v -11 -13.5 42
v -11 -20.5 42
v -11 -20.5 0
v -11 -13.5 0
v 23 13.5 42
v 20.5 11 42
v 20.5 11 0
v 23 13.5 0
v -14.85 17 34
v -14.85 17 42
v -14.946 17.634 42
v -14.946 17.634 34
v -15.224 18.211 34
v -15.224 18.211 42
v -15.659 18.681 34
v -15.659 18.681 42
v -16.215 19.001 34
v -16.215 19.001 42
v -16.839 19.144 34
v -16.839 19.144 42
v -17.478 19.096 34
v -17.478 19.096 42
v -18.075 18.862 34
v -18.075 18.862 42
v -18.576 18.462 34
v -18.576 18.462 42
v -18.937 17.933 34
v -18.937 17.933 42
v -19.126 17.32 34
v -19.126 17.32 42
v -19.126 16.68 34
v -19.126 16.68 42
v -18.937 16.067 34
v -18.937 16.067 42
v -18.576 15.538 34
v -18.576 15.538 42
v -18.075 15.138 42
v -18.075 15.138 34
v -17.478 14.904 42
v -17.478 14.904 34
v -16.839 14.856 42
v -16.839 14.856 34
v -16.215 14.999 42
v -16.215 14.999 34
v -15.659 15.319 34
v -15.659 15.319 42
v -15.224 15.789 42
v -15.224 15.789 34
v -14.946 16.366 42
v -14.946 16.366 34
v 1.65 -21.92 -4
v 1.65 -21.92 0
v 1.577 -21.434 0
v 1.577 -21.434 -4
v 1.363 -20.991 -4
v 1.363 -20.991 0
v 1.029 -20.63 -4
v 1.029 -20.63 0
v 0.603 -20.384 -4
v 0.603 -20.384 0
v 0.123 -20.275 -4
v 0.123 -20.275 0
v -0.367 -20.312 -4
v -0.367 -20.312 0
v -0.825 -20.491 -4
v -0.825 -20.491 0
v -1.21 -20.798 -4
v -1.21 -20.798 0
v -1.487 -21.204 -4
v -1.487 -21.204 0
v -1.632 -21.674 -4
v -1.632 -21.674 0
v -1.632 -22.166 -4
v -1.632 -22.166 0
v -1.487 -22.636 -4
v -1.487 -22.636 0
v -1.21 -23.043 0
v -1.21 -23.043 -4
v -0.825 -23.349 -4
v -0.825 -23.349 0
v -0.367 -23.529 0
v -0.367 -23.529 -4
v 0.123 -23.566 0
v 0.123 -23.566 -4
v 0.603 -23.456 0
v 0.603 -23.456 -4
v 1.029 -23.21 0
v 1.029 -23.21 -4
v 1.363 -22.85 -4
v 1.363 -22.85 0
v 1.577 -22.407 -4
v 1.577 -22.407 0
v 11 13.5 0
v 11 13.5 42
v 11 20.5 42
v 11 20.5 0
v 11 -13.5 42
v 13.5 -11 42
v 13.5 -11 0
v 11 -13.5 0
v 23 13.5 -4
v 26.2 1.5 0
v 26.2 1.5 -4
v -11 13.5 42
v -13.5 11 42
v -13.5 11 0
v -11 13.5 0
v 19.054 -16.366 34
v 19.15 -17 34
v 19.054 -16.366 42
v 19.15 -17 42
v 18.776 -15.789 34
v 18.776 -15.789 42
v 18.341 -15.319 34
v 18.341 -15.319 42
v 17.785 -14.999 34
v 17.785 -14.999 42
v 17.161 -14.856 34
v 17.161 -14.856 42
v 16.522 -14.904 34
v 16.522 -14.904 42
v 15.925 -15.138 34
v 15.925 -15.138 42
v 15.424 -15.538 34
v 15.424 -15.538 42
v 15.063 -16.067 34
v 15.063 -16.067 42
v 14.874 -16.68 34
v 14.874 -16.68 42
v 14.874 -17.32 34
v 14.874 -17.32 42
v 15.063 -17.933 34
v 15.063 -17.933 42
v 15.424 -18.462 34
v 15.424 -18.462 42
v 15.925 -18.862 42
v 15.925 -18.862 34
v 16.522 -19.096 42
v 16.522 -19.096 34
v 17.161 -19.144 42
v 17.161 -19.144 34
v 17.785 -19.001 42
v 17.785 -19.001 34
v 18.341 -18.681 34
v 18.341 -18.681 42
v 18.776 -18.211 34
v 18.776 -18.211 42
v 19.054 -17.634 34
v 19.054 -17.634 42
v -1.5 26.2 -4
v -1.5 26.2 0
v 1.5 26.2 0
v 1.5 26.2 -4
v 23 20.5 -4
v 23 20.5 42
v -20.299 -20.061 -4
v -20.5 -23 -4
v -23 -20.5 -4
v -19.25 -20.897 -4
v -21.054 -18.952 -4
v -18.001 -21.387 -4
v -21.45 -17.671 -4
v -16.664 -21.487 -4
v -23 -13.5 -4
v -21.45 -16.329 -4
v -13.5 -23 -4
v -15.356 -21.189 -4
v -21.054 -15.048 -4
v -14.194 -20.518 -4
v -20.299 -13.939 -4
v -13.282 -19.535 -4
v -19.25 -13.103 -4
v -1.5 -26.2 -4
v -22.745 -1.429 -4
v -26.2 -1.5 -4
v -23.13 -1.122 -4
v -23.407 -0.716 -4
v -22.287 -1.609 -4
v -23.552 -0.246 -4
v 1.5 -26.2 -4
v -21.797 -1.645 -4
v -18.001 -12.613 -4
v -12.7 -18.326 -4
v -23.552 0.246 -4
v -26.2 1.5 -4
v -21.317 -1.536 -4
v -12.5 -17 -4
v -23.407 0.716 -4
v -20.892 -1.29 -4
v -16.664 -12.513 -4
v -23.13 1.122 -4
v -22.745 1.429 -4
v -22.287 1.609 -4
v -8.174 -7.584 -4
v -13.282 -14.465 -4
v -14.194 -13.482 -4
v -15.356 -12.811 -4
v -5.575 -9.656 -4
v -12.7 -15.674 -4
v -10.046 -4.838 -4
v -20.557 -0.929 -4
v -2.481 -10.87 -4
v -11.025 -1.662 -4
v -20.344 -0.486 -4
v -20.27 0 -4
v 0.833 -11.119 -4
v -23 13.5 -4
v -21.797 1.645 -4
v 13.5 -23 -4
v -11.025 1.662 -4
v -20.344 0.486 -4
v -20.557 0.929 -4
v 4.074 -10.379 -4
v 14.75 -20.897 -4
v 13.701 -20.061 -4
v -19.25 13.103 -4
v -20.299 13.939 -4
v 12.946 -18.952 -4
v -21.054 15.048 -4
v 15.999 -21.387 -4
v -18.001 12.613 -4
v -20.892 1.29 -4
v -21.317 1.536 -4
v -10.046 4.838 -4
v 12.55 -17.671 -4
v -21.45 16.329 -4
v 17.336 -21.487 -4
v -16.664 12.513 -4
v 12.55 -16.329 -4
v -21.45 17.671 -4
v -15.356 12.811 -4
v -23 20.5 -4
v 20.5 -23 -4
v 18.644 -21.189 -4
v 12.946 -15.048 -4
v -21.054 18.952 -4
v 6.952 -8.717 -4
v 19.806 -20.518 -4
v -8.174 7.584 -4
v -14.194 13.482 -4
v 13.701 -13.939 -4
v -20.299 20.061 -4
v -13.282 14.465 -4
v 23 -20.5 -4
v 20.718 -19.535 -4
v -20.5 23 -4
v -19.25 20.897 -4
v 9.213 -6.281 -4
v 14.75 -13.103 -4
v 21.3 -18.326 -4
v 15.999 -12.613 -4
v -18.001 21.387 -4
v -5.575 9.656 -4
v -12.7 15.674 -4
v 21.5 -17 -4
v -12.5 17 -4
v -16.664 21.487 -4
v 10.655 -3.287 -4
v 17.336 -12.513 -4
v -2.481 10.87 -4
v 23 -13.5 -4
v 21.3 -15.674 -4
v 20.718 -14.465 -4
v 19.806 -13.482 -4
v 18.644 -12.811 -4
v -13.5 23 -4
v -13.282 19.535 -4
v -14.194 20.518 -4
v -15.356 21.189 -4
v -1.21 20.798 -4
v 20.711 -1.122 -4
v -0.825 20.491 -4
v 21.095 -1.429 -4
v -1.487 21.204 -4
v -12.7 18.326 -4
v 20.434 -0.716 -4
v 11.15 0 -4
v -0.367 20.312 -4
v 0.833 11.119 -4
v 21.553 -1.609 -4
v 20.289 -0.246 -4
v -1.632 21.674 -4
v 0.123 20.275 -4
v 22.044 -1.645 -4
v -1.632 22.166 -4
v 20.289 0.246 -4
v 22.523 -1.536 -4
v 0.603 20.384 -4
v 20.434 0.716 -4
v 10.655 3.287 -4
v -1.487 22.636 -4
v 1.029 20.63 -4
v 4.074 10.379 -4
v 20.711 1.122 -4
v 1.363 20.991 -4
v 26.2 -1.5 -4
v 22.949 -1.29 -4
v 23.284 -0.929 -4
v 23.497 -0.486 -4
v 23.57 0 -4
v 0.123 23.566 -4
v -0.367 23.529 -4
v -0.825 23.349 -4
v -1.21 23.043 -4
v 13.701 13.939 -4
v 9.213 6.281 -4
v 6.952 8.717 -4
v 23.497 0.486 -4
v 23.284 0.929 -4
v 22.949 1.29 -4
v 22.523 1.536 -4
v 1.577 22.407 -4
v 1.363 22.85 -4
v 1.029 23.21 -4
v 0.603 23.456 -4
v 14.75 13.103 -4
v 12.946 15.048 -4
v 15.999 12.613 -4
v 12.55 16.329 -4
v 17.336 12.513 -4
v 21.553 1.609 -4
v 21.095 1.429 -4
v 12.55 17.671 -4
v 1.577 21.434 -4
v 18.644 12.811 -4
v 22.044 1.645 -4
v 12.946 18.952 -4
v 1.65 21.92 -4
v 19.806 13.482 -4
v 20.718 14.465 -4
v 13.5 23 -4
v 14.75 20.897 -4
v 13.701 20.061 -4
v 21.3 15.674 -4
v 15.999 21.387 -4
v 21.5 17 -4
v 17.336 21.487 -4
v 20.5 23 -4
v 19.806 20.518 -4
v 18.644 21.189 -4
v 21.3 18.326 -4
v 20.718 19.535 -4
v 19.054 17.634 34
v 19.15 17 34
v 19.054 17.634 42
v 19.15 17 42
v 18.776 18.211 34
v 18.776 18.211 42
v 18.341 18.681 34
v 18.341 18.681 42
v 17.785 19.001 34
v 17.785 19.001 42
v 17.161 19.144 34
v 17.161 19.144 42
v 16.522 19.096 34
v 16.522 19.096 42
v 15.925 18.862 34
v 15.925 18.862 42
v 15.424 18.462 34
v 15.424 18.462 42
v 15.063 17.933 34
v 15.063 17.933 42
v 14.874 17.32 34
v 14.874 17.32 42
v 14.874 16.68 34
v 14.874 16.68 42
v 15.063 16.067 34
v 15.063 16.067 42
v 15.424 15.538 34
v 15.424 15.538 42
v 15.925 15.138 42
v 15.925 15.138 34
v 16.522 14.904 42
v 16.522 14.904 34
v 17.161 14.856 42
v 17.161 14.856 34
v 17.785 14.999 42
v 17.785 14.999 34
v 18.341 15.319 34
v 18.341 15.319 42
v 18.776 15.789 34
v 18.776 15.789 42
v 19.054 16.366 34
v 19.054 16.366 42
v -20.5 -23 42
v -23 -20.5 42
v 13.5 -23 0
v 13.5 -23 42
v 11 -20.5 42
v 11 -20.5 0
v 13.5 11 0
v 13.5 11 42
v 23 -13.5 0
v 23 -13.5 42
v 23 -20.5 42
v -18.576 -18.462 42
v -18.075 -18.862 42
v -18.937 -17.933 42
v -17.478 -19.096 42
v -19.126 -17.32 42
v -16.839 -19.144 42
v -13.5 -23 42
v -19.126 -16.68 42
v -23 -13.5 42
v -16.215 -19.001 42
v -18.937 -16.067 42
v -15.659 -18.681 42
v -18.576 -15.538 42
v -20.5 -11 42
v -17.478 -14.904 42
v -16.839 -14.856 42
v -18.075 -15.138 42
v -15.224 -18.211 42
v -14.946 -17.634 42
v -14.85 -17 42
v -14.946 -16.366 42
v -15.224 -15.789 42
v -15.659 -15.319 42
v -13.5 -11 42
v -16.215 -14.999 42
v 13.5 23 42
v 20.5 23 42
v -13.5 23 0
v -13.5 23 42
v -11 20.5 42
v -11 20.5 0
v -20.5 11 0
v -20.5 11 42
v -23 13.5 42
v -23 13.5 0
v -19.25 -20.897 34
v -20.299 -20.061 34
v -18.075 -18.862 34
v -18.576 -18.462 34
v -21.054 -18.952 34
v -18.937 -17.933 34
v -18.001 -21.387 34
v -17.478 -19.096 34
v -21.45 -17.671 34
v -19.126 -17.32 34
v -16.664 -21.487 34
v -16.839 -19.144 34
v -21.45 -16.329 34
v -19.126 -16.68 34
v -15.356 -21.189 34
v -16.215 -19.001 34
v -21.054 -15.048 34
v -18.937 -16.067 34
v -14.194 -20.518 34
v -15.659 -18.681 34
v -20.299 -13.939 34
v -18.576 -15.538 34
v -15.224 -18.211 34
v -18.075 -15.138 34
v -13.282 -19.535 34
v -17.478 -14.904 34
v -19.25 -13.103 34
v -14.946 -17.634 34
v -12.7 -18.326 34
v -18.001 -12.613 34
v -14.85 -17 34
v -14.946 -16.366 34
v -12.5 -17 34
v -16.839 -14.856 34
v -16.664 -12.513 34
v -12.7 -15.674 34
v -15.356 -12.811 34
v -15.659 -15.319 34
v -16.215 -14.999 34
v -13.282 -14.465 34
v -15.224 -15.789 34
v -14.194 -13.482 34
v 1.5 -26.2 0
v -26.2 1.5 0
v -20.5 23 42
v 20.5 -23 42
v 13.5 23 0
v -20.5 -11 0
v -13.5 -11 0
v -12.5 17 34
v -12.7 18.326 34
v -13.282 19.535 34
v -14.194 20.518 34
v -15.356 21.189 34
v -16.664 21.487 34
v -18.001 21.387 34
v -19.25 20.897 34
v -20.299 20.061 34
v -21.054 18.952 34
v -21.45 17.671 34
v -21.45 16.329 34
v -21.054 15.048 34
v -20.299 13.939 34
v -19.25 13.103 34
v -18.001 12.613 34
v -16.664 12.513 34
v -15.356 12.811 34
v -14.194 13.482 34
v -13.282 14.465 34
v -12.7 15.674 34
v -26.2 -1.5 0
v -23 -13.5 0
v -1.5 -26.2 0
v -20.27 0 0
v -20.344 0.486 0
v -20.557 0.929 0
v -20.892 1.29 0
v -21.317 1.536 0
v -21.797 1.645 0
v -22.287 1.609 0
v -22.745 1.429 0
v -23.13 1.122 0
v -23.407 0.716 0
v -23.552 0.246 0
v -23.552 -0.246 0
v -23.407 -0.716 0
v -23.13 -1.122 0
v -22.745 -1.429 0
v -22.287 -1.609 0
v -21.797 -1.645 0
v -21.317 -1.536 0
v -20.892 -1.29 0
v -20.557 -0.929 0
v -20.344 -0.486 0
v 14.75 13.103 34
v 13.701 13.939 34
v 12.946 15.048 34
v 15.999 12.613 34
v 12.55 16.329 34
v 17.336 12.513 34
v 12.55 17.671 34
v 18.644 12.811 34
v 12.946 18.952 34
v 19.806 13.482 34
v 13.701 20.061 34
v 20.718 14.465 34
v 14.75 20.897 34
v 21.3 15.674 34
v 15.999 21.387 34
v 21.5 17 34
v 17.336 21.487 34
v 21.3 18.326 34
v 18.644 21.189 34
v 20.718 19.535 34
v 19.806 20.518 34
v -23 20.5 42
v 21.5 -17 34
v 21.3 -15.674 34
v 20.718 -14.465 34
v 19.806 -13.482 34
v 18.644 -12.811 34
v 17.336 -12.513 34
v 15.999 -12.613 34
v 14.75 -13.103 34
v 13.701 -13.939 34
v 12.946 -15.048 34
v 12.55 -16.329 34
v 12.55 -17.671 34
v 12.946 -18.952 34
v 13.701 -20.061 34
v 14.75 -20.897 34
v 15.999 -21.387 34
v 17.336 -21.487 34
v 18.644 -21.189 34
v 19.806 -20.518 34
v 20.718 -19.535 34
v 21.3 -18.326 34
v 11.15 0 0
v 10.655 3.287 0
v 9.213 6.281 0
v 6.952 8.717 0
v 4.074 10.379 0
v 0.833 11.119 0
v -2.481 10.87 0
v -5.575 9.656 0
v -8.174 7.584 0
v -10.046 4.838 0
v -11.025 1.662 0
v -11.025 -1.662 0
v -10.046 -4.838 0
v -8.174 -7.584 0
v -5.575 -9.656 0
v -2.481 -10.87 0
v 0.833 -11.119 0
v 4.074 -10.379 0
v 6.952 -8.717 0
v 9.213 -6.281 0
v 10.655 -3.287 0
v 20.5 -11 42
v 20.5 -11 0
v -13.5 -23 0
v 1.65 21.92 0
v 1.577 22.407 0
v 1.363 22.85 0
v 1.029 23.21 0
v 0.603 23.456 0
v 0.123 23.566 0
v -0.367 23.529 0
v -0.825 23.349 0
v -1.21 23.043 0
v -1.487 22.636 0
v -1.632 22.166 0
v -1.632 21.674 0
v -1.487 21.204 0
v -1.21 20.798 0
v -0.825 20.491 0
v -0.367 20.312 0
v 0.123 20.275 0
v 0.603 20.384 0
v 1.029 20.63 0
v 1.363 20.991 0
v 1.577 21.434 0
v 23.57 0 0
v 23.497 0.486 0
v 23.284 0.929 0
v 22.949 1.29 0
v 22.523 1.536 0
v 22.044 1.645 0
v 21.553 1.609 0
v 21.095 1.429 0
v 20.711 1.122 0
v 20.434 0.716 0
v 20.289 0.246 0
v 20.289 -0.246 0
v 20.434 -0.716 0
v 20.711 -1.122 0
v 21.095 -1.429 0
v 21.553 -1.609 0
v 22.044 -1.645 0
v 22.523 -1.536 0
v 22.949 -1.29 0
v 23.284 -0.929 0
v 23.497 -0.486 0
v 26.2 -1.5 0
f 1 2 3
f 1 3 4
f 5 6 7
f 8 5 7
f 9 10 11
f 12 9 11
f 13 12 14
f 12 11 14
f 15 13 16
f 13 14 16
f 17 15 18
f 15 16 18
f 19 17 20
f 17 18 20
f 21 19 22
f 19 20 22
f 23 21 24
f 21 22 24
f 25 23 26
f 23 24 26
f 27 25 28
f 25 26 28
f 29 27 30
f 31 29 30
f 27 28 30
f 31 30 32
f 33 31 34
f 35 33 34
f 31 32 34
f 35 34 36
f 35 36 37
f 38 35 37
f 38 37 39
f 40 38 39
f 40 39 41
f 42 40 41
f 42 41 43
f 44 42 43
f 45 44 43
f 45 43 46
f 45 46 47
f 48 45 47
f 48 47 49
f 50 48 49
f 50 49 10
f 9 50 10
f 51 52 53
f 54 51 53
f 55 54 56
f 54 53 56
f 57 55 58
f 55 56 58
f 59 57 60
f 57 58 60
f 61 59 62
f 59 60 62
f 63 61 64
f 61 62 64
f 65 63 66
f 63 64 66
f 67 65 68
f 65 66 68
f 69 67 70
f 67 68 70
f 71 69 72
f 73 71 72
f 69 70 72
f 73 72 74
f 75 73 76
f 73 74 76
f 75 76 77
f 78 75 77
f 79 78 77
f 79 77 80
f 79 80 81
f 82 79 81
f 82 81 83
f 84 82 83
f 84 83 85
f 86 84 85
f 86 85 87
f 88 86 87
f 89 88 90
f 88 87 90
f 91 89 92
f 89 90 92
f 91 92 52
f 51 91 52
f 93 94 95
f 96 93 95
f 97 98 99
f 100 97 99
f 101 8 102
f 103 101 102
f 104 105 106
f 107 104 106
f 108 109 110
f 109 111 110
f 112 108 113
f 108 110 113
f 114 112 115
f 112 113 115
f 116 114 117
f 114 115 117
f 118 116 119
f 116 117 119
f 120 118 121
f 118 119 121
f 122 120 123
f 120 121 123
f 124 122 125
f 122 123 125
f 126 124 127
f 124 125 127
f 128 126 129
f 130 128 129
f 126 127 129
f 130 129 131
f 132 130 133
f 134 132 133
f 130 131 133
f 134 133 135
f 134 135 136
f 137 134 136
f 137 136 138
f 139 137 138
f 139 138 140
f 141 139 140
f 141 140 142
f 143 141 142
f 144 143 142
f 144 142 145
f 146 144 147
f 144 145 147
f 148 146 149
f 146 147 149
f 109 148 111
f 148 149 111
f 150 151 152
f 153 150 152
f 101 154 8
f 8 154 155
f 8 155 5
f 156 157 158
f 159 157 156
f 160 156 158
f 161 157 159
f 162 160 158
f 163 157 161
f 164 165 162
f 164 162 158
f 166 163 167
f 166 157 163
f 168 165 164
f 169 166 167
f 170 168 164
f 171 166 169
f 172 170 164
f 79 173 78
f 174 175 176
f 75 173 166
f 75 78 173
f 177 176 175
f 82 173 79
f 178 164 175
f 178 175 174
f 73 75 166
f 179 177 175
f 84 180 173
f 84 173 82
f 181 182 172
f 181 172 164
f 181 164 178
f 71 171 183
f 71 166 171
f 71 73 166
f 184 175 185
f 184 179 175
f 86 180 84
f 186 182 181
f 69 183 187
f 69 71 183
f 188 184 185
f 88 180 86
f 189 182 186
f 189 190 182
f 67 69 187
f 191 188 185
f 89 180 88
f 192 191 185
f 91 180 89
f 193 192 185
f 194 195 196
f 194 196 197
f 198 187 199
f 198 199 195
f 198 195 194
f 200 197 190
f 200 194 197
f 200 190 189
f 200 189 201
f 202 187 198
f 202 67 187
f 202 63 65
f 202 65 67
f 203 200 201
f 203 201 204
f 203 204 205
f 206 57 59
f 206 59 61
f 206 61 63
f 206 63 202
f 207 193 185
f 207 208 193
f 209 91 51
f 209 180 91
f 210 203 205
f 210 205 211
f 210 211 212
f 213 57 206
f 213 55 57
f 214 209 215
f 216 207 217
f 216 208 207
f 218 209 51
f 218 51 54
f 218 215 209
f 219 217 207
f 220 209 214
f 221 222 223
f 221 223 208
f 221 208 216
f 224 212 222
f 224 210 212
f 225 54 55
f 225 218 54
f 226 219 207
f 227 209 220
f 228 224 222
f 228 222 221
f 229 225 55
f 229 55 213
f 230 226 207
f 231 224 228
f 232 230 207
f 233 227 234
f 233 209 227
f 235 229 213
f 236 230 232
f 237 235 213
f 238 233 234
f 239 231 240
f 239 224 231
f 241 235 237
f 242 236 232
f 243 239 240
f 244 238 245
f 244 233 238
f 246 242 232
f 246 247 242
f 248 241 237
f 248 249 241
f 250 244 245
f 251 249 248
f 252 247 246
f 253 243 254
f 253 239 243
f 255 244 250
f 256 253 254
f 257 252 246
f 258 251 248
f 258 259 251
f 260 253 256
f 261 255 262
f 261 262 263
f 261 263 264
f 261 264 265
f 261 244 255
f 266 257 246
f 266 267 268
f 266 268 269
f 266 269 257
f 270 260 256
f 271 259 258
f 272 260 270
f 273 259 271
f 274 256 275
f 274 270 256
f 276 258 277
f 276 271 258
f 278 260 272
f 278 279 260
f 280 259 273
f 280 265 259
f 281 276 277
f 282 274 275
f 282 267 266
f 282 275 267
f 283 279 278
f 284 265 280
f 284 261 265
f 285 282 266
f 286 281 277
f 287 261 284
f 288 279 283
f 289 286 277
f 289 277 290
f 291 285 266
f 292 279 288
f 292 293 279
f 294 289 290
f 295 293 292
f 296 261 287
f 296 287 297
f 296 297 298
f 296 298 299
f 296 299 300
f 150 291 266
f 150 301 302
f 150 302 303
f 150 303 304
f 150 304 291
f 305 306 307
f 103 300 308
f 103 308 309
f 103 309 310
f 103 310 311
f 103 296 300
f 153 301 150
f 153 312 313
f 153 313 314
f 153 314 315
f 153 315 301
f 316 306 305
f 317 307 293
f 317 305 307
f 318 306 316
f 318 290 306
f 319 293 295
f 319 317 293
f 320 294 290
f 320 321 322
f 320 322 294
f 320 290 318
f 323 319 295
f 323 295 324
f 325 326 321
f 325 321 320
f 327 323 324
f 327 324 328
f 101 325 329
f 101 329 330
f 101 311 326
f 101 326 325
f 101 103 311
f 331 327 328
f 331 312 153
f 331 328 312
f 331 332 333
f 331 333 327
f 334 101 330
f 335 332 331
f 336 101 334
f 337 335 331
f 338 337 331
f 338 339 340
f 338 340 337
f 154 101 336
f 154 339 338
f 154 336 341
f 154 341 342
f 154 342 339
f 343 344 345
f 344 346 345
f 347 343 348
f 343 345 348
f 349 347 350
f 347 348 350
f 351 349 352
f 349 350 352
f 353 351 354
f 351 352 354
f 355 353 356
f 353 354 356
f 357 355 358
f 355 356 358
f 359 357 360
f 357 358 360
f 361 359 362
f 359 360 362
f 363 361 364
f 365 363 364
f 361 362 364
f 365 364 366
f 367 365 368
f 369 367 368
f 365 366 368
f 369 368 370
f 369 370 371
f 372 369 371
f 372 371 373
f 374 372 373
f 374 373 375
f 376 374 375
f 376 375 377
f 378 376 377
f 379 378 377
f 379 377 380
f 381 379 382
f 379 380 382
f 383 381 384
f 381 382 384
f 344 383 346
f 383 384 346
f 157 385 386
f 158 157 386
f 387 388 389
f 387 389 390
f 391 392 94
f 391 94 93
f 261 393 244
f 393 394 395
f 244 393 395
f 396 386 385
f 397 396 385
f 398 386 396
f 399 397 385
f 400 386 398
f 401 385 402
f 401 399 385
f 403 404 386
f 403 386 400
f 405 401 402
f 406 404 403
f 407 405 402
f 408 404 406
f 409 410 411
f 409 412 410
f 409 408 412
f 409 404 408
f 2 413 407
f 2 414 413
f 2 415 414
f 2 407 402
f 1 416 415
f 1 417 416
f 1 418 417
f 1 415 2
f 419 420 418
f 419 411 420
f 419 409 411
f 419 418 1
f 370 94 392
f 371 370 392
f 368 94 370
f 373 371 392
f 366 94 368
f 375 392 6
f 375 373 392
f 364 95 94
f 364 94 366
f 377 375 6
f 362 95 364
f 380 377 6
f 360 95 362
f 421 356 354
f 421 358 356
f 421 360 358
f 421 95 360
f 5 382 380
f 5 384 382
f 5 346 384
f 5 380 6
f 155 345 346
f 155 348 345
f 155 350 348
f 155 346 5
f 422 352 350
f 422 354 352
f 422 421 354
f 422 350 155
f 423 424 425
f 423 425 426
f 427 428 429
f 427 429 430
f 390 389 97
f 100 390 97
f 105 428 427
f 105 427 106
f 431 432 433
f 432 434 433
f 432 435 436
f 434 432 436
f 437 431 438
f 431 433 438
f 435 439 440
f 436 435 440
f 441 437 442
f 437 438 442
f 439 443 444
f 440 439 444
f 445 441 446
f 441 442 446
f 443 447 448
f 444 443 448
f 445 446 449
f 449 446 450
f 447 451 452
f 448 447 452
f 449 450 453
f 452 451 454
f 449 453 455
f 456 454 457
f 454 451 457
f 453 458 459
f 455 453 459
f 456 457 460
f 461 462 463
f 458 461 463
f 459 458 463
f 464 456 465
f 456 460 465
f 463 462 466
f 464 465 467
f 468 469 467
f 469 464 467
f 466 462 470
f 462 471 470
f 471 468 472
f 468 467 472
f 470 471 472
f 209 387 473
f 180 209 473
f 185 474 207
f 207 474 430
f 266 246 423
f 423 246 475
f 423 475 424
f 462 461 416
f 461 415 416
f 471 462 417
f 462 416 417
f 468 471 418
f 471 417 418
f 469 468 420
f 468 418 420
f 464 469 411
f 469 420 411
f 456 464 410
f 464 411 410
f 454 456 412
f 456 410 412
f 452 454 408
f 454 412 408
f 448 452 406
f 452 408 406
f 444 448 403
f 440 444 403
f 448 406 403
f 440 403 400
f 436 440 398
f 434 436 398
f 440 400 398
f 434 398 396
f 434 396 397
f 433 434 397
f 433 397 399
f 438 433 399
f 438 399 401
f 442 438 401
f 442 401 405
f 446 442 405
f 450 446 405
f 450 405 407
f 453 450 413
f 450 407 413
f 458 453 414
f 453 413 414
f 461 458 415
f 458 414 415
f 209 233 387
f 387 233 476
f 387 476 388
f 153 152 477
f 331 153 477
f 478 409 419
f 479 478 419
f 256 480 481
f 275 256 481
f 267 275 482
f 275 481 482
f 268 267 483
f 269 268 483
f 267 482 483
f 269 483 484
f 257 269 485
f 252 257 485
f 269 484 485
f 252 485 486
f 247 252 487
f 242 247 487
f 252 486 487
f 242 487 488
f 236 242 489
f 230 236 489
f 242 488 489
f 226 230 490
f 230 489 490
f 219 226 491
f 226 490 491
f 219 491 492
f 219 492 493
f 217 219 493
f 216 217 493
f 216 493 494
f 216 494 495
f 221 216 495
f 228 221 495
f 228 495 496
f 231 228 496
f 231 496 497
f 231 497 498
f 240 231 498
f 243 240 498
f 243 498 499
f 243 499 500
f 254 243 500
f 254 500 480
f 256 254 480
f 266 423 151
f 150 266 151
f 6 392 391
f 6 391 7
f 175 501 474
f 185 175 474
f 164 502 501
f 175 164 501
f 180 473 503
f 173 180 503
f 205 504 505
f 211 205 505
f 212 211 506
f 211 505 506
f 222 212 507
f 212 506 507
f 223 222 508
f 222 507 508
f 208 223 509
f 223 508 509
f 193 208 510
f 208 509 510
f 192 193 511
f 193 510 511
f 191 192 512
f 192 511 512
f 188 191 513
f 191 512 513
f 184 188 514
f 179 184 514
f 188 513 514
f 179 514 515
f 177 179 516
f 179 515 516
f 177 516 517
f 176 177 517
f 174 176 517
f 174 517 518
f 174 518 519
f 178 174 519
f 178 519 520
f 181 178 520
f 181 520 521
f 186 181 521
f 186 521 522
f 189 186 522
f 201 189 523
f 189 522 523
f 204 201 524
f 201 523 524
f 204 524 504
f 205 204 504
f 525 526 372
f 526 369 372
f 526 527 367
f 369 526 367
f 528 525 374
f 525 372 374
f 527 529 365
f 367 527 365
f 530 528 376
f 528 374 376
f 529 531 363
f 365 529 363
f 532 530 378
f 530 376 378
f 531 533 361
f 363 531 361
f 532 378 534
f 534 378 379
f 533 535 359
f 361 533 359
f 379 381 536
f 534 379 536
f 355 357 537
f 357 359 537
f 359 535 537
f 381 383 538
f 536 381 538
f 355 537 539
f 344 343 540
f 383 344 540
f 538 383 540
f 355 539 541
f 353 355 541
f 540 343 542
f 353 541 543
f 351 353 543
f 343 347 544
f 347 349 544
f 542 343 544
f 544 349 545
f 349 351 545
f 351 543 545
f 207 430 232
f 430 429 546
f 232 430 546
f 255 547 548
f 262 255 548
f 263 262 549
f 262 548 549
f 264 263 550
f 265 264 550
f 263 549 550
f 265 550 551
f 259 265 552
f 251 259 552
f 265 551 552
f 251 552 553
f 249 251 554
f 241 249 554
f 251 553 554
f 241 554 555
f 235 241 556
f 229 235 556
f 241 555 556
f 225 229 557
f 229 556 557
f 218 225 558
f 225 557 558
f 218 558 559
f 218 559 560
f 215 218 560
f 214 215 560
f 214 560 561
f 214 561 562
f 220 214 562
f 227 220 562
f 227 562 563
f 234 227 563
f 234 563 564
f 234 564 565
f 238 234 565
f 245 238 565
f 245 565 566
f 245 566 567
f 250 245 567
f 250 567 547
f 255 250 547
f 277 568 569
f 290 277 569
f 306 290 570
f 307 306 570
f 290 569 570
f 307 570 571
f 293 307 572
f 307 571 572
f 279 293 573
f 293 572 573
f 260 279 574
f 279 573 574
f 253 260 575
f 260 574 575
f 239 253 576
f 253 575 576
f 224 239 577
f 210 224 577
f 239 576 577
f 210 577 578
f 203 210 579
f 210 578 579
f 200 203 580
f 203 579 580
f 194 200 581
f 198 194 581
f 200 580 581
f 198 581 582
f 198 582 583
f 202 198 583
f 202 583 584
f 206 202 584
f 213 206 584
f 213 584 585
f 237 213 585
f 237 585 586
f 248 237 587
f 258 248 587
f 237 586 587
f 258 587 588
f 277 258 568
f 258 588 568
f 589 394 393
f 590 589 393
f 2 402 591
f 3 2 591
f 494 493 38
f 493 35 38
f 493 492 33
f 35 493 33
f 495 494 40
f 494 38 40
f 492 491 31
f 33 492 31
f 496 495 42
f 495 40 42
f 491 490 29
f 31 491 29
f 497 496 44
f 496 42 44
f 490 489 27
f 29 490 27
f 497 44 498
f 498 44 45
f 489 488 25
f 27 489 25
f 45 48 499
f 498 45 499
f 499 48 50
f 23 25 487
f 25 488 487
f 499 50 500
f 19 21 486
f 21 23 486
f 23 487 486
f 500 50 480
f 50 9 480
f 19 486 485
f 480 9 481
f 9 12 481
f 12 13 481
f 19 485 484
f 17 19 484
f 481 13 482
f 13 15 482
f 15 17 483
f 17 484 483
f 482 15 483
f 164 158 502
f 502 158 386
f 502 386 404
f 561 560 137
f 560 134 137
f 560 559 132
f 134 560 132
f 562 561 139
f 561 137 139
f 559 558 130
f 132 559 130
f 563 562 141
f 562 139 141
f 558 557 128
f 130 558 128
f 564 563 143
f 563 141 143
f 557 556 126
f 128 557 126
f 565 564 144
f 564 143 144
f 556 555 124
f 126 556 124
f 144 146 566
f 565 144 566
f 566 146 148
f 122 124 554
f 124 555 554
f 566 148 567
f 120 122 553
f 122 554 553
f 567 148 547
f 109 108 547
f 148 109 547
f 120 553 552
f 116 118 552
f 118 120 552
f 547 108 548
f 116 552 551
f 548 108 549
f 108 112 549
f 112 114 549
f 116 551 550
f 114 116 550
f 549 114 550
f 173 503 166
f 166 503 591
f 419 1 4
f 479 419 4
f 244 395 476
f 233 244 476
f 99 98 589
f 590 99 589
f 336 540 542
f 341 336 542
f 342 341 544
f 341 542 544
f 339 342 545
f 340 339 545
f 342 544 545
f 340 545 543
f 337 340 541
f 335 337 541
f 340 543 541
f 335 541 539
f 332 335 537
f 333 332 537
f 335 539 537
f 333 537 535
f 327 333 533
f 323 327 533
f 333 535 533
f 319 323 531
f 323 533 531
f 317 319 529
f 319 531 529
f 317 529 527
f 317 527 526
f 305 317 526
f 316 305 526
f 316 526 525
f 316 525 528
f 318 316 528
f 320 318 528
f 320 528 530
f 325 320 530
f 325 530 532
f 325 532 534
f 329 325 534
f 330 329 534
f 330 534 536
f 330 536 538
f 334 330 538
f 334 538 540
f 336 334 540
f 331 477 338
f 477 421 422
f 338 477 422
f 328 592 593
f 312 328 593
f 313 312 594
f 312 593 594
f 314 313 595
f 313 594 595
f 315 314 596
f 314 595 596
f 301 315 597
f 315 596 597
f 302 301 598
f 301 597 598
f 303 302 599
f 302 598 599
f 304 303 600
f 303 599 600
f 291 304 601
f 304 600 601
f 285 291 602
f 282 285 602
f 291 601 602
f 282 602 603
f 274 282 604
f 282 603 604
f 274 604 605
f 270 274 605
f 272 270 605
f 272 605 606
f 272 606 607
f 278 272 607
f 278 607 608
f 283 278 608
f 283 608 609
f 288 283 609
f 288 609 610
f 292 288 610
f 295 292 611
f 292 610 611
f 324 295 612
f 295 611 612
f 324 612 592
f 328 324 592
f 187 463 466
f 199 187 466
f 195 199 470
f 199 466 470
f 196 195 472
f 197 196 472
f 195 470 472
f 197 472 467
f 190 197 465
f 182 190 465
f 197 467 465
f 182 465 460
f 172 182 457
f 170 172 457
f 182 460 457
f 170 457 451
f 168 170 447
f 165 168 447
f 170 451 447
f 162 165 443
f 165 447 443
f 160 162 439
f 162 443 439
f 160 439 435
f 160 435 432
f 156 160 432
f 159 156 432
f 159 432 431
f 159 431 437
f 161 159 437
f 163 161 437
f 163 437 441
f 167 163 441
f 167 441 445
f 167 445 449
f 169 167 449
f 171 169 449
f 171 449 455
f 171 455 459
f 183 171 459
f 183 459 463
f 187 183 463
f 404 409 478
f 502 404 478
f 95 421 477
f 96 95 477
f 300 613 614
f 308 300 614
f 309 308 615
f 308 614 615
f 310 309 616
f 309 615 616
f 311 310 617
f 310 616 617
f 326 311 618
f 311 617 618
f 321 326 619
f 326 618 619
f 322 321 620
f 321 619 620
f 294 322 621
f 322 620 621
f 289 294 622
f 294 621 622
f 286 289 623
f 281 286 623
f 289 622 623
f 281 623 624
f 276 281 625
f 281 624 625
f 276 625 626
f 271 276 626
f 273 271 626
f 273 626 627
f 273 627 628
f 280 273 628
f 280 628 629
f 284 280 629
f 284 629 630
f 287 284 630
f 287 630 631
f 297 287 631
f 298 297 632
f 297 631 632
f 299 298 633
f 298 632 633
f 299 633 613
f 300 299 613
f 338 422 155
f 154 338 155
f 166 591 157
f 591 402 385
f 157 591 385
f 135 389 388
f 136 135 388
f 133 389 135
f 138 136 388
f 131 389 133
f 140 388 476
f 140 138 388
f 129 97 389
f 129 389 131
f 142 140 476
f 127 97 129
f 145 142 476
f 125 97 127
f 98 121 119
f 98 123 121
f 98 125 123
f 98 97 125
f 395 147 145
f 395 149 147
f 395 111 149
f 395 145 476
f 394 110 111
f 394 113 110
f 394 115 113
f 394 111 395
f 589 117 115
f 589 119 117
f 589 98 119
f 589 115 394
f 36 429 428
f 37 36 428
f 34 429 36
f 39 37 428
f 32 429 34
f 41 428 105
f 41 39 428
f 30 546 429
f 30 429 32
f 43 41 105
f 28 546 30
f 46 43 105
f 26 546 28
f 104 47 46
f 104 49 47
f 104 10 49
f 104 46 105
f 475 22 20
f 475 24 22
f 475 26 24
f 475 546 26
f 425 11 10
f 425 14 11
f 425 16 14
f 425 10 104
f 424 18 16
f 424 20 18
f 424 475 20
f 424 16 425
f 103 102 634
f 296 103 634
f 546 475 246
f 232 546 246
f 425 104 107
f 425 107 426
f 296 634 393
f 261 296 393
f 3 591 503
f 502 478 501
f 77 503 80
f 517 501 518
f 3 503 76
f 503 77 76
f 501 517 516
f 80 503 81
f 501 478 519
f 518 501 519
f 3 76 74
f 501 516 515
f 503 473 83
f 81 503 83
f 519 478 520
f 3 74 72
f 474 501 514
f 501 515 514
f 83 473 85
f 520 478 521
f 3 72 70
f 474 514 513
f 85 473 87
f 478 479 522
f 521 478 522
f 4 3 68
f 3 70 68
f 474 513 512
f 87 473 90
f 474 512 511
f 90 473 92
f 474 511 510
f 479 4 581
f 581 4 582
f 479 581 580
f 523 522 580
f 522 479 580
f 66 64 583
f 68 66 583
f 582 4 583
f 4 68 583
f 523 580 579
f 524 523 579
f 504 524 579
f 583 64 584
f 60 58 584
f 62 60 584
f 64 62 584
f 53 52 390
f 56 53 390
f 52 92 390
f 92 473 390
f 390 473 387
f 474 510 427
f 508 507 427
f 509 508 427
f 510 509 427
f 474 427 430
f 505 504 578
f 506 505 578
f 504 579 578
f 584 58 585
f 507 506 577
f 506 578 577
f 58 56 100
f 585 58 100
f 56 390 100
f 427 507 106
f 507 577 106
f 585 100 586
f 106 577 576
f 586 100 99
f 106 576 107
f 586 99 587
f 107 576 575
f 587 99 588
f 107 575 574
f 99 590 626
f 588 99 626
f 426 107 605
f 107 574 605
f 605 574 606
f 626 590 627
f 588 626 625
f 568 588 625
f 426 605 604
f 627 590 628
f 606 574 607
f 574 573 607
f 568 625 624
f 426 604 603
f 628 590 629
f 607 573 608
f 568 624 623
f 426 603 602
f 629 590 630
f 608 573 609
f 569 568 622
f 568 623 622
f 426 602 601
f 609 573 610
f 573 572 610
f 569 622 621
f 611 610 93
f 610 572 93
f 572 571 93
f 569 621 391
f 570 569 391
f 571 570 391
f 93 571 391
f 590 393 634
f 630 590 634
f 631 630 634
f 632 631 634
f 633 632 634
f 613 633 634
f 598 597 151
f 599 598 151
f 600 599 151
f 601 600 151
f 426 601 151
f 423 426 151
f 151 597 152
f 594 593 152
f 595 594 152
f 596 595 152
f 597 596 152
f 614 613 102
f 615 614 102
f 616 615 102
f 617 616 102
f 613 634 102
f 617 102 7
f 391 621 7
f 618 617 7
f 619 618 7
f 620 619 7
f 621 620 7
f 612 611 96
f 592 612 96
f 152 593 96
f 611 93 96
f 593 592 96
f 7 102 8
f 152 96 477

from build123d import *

# Parameters (mm, degrees)
SKETCH1_W           = 50
SKETCH1_H           = 50
SKETCH1_R           = 11.15
SKETCH1_R_2         = 2.15
SKETCH1_R_3         = 1.65
BOSS_EXTRUDE1_DEPTH = 4
BOSS_EXTRUDE2_START = 42
SKETCH2_W           = 12
SKETCH2_H           = 12
SKETCH2_R           = 2.15
BOSS_EXTRUDE2_DEPTH = 42
CHAMFER1_SIZE       = 2.5
CUT_EXTRUDE1_START  = -8
SKETCH3_R           = 4.5
CUT_EXTRUDE1_DEPTH  = 51.017238817
SKETCH5_W           = 56
SKETCH5_H           = 56
CUT_EXTRUDE2_DEPTH  = 55.899908925
BOSS_EXTRUDE3_DEPTH = 4
CIRPATTERN1_COUNT   = 4


with BuildPart() as part:
    # Sketch1 → Boss-Extrude1 (new body)
    with BuildSketch(Plane.XY):
        Rectangle(SKETCH1_W, SKETCH1_H)
        Circle(SKETCH1_R, mode=Mode.SUBTRACT)
        with Locations((-17, 17)):
            Circle(SKETCH1_R_2, mode=Mode.SUBTRACT)
        with Locations((17, 17)):
            Circle(SKETCH1_R_2, mode=Mode.SUBTRACT)
        with Locations((17, -17)):
            Circle(SKETCH1_R_2, mode=Mode.SUBTRACT)
        with Locations((-17, -17)):
            Circle(SKETCH1_R_2, mode=Mode.SUBTRACT)
        with Locations((-21.920310217, 0)):
            Circle(SKETCH1_R_3, mode=Mode.SUBTRACT)
        with Locations((0, 21.920310217)):
            Circle(SKETCH1_R_3, mode=Mode.SUBTRACT)
        with Locations((21.920310217, 0)):
            Circle(SKETCH1_R_3, mode=Mode.SUBTRACT)
        with Locations((0, -21.920310217)):
            Circle(SKETCH1_R_3, mode=Mode.SUBTRACT)
    extrude(amount=-BOSS_EXTRUDE1_DEPTH)

    # Sketch2 → Boss-Extrude2 (add)
    # profile 1 of 4: a face of its own
    with BuildSketch(Plane.XY.offset(BOSS_EXTRUDE2_START)):
        with Locations((-17, 17)):
            Rectangle(SKETCH2_W, SKETCH2_H)
        with Locations((-17, 17)):
            Circle(SKETCH2_R, mode=Mode.SUBTRACT)
    # profile 2 of 4: a face of its own
    with BuildSketch(Plane.XY.offset(BOSS_EXTRUDE2_START)):
        with Locations((17, 17)):
            Rectangle(SKETCH2_W, SKETCH2_H)
        with Locations((17, 17)):
            Circle(SKETCH2_R, mode=Mode.SUBTRACT)
    # profile 3 of 4: a face of its own
    with BuildSketch(Plane.XY.offset(BOSS_EXTRUDE2_START)):
        with Locations((17, -17)):
            Rectangle(SKETCH2_W, SKETCH2_H)
        with Locations((17, -17)):
            Circle(SKETCH2_R, mode=Mode.SUBTRACT)
    # profile 4 of 4: a face of its own
    with BuildSketch(Plane.XY.offset(BOSS_EXTRUDE2_START)):
        with Locations((-17, -17)):
            Rectangle(SKETCH2_W, SKETCH2_H)
        with Locations((-17, -17)):
            Circle(SKETCH2_R, mode=Mode.SUBTRACT)
    extrude(amount=-BOSS_EXTRUDE2_DEPTH)

    # Chamfer1
    chamfer1_edges = [part.edges().sort_by_distance(p)[0] for p in [
        (-23, 23, 21),
        (-23, 11, 21),
        (-11, 11, 21),
        (-11, 23, 21),
        (23, 11, 21),
        (23, 23, 21),
        (11, 23, 21),
        (11, 11, 21),
        (23, -23, 21),
        (23, -11, 21),
        (11, -11, 21),
        (11, -23, 21),
        (-23, -11, 21),
        (-23, -23, 21),
        (-11, -23, 21),
        (-11, -11, 21),
    ]]
    chamfer(chamfer1_edges, length=CHAMFER1_SIZE)

    # Sketch3 → Cut-Extrude1 (cut, through all)
    with BuildSketch(Plane.XY.offset(42).offset(CUT_EXTRUDE1_START)):
        with Locations((-17, 17)):
            Circle(SKETCH3_R)
        with Locations((17, 17)):
            Circle(SKETCH3_R)
        with Locations((17, -17)):
            Circle(SKETCH3_R)
        with Locations((-17, -17)):
            Circle(SKETCH3_R)
    extrude(amount=-CUT_EXTRUDE1_DEPTH, mode=Mode.SUBTRACT)

    # Sketch5 → Cut-Extrude2 (cut, through all)
    with BuildSketch(Plane.XY):
        Rectangle(SKETCH5_W, SKETCH5_H)
        Polygon((-23, 20.5), (-20.5, 23), (-13.5, 23), (-6, 25), (6, 25), (13.5, 23), (20.5, 23), (23, 20.5), (23, 13.5), (25, 6), (25, -6), (23, -13.5), (23, -20.5), (20.5, -23), (13.5, -23), (6, -25), (-6, -25), (-13.5, -23), (-20.5, -23), (-23, -20.5), (-23, -13.5), (-25, -6), (-25, 6), (-23, 13.5), align=None, mode=Mode.SUBTRACT)
    extrude(amount=-CUT_EXTRUDE2_DEPTH, mode=Mode.SUBTRACT)

    # Sketch6 → Boss-Extrude3 (add)
    with BuildSketch(Plane.XY):
        Polygon((-6, 25), (-1.5, 26.2), (1.5, 26.2), (6, 25), align=None)
    boss_extrude3 = extrude(amount=-BOSS_EXTRUDE3_DEPTH)

    # CirPattern1: Boss-Extrude3 ×4 about axis
    cirpattern1_axis = Axis((0, 0, 0), (0, 0, 1))
    for i in range(1, CIRPATTERN1_COUNT):
        add(boss_extrude3.rotate(cirpattern1_axis, i * 360 / CIRPATTERN1_COUNT))


solid = part.part
